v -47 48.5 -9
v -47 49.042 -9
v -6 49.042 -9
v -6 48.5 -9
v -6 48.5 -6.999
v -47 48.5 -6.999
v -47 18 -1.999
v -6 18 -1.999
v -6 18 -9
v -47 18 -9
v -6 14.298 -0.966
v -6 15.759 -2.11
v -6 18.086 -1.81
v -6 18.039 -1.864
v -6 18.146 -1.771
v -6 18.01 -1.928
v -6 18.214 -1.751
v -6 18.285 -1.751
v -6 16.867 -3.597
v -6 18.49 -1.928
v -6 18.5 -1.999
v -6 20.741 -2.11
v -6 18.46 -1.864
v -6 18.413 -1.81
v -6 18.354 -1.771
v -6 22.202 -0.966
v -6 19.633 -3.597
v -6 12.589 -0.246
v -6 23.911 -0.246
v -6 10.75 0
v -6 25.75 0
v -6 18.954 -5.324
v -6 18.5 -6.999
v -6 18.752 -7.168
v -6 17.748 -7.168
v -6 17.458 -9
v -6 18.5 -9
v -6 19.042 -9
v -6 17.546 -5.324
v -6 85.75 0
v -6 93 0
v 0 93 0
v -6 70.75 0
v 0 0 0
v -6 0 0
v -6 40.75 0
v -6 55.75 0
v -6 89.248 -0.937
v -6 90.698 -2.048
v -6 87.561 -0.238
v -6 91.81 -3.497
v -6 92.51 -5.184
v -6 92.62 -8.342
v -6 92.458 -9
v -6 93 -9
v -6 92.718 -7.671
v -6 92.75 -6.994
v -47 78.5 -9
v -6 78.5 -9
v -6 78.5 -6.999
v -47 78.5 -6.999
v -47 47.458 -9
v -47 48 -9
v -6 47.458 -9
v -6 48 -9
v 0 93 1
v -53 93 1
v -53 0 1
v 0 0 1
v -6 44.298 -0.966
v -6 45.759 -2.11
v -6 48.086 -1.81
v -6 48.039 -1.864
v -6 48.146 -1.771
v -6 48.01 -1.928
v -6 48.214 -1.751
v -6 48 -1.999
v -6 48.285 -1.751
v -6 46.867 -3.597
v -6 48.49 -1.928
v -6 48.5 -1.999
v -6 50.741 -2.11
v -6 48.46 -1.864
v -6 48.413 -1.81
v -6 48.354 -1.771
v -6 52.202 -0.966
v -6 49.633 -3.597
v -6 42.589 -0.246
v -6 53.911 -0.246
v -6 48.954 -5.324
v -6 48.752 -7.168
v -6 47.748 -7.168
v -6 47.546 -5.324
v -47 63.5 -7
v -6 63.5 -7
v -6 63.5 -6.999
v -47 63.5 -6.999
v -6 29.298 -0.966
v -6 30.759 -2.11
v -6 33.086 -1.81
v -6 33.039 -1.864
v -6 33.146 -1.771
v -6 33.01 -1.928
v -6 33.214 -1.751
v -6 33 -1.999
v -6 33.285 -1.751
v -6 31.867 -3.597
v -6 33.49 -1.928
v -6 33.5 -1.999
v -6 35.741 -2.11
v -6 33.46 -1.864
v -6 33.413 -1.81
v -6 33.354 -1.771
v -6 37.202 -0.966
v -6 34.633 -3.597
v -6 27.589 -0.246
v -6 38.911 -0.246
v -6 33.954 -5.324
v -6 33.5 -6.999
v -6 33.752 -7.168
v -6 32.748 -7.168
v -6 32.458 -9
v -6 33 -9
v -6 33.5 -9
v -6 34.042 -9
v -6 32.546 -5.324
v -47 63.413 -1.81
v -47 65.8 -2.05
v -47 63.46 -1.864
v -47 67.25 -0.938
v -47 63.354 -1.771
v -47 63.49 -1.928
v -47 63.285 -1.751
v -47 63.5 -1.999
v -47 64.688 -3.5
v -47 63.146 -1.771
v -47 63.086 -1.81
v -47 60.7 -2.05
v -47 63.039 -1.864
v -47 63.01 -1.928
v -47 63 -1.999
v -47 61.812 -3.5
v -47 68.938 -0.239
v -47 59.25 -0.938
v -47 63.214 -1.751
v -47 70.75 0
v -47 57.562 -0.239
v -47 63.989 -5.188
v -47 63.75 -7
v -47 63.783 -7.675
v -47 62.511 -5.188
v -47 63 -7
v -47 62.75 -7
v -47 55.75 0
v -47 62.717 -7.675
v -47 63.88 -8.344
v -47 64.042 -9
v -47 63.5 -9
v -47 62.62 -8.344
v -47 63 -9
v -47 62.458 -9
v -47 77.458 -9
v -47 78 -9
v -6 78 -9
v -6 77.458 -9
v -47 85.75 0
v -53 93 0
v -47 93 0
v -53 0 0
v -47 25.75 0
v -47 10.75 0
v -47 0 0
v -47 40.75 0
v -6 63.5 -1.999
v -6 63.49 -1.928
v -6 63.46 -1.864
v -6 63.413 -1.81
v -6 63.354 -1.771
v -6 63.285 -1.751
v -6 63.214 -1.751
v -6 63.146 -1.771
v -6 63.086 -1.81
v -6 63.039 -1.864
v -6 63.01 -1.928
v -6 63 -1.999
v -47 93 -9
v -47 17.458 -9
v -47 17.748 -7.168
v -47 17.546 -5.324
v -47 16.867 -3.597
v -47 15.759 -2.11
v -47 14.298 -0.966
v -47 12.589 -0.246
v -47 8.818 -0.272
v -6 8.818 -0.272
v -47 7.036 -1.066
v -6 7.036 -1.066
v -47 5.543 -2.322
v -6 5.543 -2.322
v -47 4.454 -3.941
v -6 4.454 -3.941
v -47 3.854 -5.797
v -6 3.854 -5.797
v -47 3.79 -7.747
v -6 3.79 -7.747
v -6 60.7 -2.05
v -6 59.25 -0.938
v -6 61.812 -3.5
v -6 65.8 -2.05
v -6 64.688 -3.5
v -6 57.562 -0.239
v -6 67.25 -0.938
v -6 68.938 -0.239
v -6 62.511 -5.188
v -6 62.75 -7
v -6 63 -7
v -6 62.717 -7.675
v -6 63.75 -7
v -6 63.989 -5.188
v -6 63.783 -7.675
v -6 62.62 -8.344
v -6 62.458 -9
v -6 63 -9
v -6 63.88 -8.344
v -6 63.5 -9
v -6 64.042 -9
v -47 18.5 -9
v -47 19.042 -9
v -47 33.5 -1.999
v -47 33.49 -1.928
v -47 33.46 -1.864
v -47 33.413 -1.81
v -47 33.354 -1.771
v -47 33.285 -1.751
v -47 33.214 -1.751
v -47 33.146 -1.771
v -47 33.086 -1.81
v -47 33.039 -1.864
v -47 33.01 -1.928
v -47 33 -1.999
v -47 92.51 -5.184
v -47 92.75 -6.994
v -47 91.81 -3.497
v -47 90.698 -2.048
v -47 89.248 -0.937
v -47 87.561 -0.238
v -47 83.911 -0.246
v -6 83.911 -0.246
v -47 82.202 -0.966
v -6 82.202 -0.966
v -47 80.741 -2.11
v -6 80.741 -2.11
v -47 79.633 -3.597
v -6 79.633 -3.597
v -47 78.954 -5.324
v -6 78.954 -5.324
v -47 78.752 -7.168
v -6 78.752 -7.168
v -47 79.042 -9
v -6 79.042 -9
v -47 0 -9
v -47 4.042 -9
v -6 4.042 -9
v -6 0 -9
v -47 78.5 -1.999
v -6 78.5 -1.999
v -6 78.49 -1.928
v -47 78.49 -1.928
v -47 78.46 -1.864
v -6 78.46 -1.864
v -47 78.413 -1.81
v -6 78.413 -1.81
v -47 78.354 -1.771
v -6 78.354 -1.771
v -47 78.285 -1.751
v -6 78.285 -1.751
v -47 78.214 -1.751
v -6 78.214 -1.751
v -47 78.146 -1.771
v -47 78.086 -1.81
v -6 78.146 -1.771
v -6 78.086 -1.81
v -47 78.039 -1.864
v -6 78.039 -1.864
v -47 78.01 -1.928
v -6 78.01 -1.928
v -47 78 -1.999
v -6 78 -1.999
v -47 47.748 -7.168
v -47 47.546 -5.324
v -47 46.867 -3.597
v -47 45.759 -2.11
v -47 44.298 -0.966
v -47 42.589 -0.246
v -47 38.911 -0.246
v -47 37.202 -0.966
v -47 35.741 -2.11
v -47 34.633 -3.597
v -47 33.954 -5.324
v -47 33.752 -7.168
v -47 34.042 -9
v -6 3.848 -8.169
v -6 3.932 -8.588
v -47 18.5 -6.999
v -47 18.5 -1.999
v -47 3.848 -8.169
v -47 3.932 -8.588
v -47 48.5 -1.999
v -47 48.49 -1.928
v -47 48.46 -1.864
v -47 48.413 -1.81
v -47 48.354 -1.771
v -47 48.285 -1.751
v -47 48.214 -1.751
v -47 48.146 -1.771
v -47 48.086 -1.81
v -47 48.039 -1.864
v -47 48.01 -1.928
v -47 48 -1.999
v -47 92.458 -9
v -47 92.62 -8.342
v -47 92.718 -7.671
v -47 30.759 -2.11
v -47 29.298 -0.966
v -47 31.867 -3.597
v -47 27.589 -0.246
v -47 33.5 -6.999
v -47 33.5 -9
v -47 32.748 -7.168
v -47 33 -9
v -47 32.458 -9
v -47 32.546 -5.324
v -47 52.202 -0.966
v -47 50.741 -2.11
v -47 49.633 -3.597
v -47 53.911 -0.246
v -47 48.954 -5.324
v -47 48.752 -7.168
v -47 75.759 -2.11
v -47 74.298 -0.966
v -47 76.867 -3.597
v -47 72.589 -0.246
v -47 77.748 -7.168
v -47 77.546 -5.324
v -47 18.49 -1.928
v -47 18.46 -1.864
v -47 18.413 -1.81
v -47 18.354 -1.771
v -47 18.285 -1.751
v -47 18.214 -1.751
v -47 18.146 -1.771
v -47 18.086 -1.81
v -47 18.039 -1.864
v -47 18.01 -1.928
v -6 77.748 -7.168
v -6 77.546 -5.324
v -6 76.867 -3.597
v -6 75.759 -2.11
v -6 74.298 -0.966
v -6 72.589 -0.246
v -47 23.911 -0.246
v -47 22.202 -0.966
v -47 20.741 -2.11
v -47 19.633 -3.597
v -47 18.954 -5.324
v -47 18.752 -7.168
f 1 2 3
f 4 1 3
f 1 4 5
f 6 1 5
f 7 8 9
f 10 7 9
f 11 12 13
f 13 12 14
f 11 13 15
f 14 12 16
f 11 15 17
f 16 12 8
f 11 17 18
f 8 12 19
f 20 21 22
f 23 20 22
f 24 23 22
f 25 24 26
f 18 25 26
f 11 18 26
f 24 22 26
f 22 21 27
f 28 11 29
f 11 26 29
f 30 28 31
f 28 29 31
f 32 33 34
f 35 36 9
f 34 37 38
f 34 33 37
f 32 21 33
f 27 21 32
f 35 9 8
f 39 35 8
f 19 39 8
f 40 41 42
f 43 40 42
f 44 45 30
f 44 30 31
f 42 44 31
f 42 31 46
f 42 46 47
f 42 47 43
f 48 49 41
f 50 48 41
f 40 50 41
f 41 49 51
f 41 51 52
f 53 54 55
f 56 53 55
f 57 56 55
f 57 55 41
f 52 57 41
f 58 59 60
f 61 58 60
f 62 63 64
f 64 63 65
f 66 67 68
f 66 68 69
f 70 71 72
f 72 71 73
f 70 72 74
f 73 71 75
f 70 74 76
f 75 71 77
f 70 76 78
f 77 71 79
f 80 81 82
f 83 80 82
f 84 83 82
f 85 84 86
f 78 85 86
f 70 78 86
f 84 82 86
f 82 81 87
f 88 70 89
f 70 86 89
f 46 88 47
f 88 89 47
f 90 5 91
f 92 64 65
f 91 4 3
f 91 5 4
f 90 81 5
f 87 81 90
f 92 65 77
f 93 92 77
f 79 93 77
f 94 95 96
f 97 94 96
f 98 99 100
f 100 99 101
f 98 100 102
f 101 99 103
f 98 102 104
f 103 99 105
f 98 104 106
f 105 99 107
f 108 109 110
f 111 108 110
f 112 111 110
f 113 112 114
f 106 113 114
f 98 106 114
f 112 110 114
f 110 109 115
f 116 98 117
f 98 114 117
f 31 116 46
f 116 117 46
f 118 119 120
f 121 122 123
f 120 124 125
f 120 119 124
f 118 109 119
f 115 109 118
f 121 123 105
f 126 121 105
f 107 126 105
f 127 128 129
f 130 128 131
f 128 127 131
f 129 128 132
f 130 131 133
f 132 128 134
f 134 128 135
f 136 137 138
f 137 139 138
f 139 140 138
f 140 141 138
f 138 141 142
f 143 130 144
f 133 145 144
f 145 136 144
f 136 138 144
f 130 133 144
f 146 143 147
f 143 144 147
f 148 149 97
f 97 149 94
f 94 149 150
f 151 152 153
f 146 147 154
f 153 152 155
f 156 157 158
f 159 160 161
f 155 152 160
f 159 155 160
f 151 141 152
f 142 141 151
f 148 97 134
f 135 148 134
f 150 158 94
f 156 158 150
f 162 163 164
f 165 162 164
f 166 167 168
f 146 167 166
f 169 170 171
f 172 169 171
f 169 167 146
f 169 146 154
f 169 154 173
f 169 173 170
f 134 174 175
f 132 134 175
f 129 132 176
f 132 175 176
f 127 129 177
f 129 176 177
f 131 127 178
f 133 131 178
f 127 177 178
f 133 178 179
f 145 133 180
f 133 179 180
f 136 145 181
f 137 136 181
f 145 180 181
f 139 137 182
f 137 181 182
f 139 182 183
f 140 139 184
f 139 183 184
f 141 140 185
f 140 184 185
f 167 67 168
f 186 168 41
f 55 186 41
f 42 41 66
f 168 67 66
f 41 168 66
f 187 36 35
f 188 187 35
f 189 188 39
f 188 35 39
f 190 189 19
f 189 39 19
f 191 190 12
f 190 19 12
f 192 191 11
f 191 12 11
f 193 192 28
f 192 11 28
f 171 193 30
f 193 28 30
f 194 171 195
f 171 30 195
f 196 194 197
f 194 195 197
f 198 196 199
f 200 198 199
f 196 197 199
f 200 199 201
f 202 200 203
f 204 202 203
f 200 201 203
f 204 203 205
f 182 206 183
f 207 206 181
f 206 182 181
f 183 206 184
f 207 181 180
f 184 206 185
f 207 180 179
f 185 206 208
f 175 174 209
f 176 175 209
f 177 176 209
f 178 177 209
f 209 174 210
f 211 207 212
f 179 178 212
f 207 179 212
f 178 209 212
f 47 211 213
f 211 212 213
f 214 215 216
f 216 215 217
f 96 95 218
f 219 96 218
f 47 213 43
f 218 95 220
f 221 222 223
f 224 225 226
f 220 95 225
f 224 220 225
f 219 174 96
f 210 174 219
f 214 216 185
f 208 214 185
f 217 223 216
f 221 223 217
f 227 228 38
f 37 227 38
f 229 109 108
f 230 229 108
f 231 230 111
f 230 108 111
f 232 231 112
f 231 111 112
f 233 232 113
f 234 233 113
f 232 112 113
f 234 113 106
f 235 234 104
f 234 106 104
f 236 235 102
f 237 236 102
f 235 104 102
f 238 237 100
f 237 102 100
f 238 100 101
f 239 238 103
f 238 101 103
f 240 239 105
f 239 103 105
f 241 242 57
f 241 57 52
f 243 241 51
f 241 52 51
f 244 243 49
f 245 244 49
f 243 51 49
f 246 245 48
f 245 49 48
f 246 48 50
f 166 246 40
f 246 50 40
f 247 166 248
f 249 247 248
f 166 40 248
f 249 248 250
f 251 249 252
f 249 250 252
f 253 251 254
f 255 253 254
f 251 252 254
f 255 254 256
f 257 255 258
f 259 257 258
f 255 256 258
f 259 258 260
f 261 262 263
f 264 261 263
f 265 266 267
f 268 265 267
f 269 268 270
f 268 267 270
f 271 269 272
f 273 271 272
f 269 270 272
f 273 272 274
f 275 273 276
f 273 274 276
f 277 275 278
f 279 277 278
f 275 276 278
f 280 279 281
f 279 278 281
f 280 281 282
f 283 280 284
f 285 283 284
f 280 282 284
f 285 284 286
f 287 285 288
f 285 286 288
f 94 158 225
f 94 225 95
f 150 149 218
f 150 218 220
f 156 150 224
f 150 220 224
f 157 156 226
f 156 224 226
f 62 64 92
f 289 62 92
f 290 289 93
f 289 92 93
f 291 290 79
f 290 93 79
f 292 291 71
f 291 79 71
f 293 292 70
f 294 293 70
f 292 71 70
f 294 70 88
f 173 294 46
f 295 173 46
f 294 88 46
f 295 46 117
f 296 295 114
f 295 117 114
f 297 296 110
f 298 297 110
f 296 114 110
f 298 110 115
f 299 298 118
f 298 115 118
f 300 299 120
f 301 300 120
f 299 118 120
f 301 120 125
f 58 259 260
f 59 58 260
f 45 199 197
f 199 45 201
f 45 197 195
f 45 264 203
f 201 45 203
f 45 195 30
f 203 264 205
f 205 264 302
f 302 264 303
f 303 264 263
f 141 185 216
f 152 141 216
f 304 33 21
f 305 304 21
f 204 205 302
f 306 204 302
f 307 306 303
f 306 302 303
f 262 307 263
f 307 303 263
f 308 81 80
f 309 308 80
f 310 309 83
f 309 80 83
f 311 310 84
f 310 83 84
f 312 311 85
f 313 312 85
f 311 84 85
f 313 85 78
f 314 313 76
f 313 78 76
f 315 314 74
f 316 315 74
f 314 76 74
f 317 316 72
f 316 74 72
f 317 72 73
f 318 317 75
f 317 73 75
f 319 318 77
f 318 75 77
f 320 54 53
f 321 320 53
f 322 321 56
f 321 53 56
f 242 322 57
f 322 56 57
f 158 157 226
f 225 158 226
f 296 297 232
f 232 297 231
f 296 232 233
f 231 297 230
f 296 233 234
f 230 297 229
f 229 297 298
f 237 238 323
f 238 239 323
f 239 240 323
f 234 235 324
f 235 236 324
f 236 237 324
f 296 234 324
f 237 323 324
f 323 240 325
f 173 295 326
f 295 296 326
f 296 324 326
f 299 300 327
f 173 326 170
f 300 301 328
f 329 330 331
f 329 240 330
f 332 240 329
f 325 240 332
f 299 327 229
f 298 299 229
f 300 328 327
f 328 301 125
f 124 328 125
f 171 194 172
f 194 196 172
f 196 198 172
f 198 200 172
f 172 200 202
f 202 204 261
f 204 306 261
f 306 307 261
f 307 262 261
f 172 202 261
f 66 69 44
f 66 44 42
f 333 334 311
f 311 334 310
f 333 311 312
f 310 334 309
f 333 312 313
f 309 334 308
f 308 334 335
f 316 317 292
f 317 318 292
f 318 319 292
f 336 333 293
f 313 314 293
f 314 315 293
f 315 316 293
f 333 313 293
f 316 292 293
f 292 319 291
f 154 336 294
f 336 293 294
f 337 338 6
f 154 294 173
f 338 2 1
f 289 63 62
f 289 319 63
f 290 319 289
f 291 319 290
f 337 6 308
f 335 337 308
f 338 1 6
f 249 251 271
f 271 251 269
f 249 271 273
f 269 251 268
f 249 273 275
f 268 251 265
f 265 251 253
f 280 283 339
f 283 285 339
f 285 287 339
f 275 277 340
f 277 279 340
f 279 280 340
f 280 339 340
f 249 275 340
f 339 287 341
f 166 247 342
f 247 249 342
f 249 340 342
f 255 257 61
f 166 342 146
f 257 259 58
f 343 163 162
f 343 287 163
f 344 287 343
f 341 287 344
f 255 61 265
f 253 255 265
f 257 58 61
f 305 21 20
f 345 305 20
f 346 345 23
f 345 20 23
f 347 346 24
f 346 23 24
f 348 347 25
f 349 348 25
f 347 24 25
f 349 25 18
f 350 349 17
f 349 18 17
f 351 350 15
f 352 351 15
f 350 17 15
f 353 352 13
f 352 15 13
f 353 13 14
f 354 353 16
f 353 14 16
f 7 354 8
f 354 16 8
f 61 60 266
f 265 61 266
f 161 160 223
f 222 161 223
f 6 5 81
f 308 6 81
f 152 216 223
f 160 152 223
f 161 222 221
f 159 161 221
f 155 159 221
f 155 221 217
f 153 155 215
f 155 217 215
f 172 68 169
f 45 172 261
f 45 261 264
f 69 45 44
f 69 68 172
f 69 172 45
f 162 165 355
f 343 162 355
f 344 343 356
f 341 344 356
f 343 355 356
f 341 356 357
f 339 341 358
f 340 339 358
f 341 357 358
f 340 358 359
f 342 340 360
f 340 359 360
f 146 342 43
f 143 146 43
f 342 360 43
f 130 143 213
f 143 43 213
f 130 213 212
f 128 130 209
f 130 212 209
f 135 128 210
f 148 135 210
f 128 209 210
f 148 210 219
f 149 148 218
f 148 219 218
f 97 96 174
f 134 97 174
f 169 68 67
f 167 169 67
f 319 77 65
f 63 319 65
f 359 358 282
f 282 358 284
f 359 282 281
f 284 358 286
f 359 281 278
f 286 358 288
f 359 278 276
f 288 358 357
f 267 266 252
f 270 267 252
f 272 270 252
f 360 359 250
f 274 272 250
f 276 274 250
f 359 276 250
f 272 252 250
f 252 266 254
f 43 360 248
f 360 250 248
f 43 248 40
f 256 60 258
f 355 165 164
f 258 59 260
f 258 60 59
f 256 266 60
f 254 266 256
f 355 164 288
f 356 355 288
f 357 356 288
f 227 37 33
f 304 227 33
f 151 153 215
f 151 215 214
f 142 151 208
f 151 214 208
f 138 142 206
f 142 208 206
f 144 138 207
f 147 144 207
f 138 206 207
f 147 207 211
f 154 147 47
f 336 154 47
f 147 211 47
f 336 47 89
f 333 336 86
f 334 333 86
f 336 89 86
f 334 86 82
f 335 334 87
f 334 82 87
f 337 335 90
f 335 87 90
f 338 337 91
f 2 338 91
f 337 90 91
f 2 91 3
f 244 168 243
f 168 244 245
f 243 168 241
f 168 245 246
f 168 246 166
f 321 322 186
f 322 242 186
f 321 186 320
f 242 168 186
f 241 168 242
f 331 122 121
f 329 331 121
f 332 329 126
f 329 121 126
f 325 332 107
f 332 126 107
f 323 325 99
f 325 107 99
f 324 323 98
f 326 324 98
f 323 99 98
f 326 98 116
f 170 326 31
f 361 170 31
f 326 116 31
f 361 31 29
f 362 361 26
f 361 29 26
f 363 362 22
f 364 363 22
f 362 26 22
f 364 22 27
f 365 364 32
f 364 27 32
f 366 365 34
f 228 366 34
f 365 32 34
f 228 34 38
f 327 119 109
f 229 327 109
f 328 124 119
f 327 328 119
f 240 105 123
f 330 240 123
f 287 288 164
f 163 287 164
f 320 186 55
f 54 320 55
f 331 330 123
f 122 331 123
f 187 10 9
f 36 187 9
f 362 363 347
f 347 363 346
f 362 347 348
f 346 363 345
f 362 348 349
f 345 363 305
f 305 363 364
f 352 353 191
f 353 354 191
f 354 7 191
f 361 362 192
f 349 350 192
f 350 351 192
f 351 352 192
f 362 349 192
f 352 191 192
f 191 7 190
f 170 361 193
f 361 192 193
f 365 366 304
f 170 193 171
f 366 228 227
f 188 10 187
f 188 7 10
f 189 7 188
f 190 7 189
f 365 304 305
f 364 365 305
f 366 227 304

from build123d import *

# Parameters (mm, degrees)
F0_W     = 53
F0_H     = 93
F1_DEPTH = 1
F2_W     = 53
F2_H     = 93
F3_DEPTH = 10
F5_DEPTH = 70
F6_W     = 6
F6_H     = 95.9582039332
F6_H_2   = 4.0417960668
F7_DEPTH = 9
F8_DEPTH = 60


with BuildPart() as f1:
    # F0 (on Top) → F1 (new body)
    with BuildSketch(Plane.XY):
        with Locations((-26.5, 46.5)):
            Rectangle(F0_W, F0_H)
    extrude(amount=F1_DEPTH)

    # F2 (on face) → F3 (join)
    with BuildSketch(Plane.XY.offset(1)):
        with Locations((-26.5, 46.5)):
            Rectangle(F2_W, F2_H)
    extrude(amount=-F3_DEPTH)

    # F4 (on face) → F5 (cut)
    with BuildSketch(Plane.YZ):
        Polygon((93, -9), (92.4582039325, -9), (79.0417960675, -9), (78.4996898418, -9), (77.9999999123, -9), (77.4582039325, -9), (64.0417960675, -9), (63.4996898418, -9), (62.9999999123, -9), (62.4582039325, -9), (49.0417960675, -9), (48.4996898418, -9), (47.9999999123, -9), (47.4582039325, -9), (34.0417960675, -9), (33.4996898418, -9), (32.9999999123, -9), (32.4582039318, -9), (19.0417960668, -9), (18.4996898418, -9), (17.9999999123, -9), (17.4582039318, -9), (4.0417960668, -9), (0, -9), (0, -7.7468557283), (-7.4705565355, -7.7468557283), (-7.4705565355, -22.4550403655), (98.083905875, -22.4550403655), (98.083905875, -6.994248211), (93, -6.994248211), align=None)
        with BuildLine():
            Line((79.0417960675, -9), (92.4582039325, -9))
            ThreePointArc((92.4582039325, -9), (92.6770814653, -8.0077412234), (92.7499976369, -6.994248211))
            ThreePointArc((92.7499976369, -6.994248211), (84.7365672438, -0.0737489182), (79.0417960675, -9))
        make_face()
        with BuildLine():
            Line((64.0417960675, -9), (77.4582039325, -9))
            ThreePointArc((77.4582039325, -9), (71.760587075, -0.0733331419), (63.75, -7))
            ThreePointArc((63.75, -7), (63.8233331419, -8.010587075), (64.0417960675, -9))
        make_face()
        with BuildLine():
            Line((34.0417960675, -9), (47.4582039325, -9))
            ThreePointArc((47.4582039325, -9), (40.75, 0), (34.0417960675, -9))
        make_face()
        with BuildLine():
            ThreePointArc((62.4582039325, -9), (62.6766668581, -8.010587075), (62.75, -7))
            ThreePointArc((62.75, -7), (54.739412925, -0.0733331419), (49.0417960675, -9))
            Line((49.0417960675, -9), (62.4582039325, -9))
        make_face()
        with BuildLine():
            ThreePointArc((32.4582039318, -9), (25.7499999993, 0), (19.0417960668, -9))
            Line((19.0417960668, -9), (32.4582039318, -9))
        make_face()
        with BuildLine():
            ThreePointArc((17.4582039318, -9), (11.3890997117, -0.0292359416), (3.7899564275, -7.7468557283))
            ThreePointArc((3.7899564275, -7.7468557283), (3.8872133859, -8.3791881304), (4.0417960668, -9))
            Line((4.0417960668, -9), (17.4582039318, -9))
        make_face()
    extrude(amount=-F5_DEPTH, mode=Mode.SUBTRACT)

    # F6 (on face) → F7 (cut)
    with BuildSketch(Plane(origin=(0, 0, -9), x_dir=(1, 0, 0), z_dir=(0, 0, -1))):
        with Locations((-50, -52.0208980334)):
            Rectangle(F6_W, F6_H)
        with Locations((-50, -2.0208980334)):
            Rectangle(F6_W, F6_H_2)
        with Locations((-3, -2.0208980334)):
            Rectangle(F6_W, F6_H_2)
        with Locations((-3, -52.0208980334)):
            Rectangle(F6_W, F6_H)
    extrude(amount=-F7_DEPTH, mode=Mode.SUBTRACT)

    # F4 (on face) → F8 (cut)
    with BuildSketch(Plane.YZ):
        with BuildLine():
            Line((17.9996898451, -1.9988527525), (17.9999999123, -9))
            Line((17.9999999123, -9), (18.4996898418, -9))
            Line((18.4996898418, -9), (18.4999999113, -6.9988527429))
            Line((18.4999999113, -6.9988527429), (18.4996898418, -1.9988527525))
            ThreePointArc((18.4996898418, -1.9988527525), (18.2496898435, -1.7488527542), (17.9996898451, -1.9988527525))
        make_face()
        with BuildLine():
            Line((32.9996898451, -1.9988527525), (32.9999999123, -9))
            Line((32.9999999123, -9), (33.4996898418, -9))
            Line((33.4996898418, -9), (33.4999999113, -6.9988527429))
            Line((33.4999999113, -6.9988527429), (33.4996898418, -1.9988527525))
            ThreePointArc((33.4996898418, -1.9988527525), (33.2496898435, -1.7488527542), (32.9996898451, -1.9988527525))
        make_face()
        with BuildLine():
            Line((47.9999999123, -9), (48.4996898418, -9))
            Line((48.4996898418, -9), (48.4999999113, -6.9988527429))
            Line((48.4999999113, -6.9988527429), (48.4996898418, -1.9988527525))
            ThreePointArc((48.4996898418, -1.9988527525), (48.2496898435, -1.7488527542), (47.9996898451, -1.9988527525))
            Line((47.9996898451, -1.9988527525), (47.9999999123, -9))
        make_face()
        with BuildLine():
            Line((62.9999113362, -7), (63.4999997335, -7))
            Line((63.4999997335, -7), (63.4999999113, -6.9988527429))
            Line((63.4999999113, -6.9988527429), (63.4996898418, -1.9988527525))
            ThreePointArc((63.4996898418, -1.9988527525), (63.2496898435, -1.7488527542), (62.9996898451, -1.9988527525))
            Line((62.9996898451, -1.9988527525), (62.9999113362, -7))
        make_face()
        with BuildLine():
            Line((77.9999999123, -9), (78.4996898418, -9))
            Line((78.4996898418, -9), (78.4999999113, -6.9988527429))
            Line((78.4999999113, -6.9988527429), (78.4996898418, -1.9988527525))
            ThreePointArc((78.4996898418, -1.9988527525), (78.2496898435, -1.7488527542), (77.9996898451, -1.9988527525))
            Line((77.9996898451, -1.9988527525), (77.9999999123, -9))
        make_face()
        Polygon((63.4996898418, -9), (63.4999997335, -7), (62.9999113362, -7), (62.9999999123, -9), align=None)
    extrude(amount=-F8_DEPTH, mode=Mode.SUBTRACT)


solid = f1.part
